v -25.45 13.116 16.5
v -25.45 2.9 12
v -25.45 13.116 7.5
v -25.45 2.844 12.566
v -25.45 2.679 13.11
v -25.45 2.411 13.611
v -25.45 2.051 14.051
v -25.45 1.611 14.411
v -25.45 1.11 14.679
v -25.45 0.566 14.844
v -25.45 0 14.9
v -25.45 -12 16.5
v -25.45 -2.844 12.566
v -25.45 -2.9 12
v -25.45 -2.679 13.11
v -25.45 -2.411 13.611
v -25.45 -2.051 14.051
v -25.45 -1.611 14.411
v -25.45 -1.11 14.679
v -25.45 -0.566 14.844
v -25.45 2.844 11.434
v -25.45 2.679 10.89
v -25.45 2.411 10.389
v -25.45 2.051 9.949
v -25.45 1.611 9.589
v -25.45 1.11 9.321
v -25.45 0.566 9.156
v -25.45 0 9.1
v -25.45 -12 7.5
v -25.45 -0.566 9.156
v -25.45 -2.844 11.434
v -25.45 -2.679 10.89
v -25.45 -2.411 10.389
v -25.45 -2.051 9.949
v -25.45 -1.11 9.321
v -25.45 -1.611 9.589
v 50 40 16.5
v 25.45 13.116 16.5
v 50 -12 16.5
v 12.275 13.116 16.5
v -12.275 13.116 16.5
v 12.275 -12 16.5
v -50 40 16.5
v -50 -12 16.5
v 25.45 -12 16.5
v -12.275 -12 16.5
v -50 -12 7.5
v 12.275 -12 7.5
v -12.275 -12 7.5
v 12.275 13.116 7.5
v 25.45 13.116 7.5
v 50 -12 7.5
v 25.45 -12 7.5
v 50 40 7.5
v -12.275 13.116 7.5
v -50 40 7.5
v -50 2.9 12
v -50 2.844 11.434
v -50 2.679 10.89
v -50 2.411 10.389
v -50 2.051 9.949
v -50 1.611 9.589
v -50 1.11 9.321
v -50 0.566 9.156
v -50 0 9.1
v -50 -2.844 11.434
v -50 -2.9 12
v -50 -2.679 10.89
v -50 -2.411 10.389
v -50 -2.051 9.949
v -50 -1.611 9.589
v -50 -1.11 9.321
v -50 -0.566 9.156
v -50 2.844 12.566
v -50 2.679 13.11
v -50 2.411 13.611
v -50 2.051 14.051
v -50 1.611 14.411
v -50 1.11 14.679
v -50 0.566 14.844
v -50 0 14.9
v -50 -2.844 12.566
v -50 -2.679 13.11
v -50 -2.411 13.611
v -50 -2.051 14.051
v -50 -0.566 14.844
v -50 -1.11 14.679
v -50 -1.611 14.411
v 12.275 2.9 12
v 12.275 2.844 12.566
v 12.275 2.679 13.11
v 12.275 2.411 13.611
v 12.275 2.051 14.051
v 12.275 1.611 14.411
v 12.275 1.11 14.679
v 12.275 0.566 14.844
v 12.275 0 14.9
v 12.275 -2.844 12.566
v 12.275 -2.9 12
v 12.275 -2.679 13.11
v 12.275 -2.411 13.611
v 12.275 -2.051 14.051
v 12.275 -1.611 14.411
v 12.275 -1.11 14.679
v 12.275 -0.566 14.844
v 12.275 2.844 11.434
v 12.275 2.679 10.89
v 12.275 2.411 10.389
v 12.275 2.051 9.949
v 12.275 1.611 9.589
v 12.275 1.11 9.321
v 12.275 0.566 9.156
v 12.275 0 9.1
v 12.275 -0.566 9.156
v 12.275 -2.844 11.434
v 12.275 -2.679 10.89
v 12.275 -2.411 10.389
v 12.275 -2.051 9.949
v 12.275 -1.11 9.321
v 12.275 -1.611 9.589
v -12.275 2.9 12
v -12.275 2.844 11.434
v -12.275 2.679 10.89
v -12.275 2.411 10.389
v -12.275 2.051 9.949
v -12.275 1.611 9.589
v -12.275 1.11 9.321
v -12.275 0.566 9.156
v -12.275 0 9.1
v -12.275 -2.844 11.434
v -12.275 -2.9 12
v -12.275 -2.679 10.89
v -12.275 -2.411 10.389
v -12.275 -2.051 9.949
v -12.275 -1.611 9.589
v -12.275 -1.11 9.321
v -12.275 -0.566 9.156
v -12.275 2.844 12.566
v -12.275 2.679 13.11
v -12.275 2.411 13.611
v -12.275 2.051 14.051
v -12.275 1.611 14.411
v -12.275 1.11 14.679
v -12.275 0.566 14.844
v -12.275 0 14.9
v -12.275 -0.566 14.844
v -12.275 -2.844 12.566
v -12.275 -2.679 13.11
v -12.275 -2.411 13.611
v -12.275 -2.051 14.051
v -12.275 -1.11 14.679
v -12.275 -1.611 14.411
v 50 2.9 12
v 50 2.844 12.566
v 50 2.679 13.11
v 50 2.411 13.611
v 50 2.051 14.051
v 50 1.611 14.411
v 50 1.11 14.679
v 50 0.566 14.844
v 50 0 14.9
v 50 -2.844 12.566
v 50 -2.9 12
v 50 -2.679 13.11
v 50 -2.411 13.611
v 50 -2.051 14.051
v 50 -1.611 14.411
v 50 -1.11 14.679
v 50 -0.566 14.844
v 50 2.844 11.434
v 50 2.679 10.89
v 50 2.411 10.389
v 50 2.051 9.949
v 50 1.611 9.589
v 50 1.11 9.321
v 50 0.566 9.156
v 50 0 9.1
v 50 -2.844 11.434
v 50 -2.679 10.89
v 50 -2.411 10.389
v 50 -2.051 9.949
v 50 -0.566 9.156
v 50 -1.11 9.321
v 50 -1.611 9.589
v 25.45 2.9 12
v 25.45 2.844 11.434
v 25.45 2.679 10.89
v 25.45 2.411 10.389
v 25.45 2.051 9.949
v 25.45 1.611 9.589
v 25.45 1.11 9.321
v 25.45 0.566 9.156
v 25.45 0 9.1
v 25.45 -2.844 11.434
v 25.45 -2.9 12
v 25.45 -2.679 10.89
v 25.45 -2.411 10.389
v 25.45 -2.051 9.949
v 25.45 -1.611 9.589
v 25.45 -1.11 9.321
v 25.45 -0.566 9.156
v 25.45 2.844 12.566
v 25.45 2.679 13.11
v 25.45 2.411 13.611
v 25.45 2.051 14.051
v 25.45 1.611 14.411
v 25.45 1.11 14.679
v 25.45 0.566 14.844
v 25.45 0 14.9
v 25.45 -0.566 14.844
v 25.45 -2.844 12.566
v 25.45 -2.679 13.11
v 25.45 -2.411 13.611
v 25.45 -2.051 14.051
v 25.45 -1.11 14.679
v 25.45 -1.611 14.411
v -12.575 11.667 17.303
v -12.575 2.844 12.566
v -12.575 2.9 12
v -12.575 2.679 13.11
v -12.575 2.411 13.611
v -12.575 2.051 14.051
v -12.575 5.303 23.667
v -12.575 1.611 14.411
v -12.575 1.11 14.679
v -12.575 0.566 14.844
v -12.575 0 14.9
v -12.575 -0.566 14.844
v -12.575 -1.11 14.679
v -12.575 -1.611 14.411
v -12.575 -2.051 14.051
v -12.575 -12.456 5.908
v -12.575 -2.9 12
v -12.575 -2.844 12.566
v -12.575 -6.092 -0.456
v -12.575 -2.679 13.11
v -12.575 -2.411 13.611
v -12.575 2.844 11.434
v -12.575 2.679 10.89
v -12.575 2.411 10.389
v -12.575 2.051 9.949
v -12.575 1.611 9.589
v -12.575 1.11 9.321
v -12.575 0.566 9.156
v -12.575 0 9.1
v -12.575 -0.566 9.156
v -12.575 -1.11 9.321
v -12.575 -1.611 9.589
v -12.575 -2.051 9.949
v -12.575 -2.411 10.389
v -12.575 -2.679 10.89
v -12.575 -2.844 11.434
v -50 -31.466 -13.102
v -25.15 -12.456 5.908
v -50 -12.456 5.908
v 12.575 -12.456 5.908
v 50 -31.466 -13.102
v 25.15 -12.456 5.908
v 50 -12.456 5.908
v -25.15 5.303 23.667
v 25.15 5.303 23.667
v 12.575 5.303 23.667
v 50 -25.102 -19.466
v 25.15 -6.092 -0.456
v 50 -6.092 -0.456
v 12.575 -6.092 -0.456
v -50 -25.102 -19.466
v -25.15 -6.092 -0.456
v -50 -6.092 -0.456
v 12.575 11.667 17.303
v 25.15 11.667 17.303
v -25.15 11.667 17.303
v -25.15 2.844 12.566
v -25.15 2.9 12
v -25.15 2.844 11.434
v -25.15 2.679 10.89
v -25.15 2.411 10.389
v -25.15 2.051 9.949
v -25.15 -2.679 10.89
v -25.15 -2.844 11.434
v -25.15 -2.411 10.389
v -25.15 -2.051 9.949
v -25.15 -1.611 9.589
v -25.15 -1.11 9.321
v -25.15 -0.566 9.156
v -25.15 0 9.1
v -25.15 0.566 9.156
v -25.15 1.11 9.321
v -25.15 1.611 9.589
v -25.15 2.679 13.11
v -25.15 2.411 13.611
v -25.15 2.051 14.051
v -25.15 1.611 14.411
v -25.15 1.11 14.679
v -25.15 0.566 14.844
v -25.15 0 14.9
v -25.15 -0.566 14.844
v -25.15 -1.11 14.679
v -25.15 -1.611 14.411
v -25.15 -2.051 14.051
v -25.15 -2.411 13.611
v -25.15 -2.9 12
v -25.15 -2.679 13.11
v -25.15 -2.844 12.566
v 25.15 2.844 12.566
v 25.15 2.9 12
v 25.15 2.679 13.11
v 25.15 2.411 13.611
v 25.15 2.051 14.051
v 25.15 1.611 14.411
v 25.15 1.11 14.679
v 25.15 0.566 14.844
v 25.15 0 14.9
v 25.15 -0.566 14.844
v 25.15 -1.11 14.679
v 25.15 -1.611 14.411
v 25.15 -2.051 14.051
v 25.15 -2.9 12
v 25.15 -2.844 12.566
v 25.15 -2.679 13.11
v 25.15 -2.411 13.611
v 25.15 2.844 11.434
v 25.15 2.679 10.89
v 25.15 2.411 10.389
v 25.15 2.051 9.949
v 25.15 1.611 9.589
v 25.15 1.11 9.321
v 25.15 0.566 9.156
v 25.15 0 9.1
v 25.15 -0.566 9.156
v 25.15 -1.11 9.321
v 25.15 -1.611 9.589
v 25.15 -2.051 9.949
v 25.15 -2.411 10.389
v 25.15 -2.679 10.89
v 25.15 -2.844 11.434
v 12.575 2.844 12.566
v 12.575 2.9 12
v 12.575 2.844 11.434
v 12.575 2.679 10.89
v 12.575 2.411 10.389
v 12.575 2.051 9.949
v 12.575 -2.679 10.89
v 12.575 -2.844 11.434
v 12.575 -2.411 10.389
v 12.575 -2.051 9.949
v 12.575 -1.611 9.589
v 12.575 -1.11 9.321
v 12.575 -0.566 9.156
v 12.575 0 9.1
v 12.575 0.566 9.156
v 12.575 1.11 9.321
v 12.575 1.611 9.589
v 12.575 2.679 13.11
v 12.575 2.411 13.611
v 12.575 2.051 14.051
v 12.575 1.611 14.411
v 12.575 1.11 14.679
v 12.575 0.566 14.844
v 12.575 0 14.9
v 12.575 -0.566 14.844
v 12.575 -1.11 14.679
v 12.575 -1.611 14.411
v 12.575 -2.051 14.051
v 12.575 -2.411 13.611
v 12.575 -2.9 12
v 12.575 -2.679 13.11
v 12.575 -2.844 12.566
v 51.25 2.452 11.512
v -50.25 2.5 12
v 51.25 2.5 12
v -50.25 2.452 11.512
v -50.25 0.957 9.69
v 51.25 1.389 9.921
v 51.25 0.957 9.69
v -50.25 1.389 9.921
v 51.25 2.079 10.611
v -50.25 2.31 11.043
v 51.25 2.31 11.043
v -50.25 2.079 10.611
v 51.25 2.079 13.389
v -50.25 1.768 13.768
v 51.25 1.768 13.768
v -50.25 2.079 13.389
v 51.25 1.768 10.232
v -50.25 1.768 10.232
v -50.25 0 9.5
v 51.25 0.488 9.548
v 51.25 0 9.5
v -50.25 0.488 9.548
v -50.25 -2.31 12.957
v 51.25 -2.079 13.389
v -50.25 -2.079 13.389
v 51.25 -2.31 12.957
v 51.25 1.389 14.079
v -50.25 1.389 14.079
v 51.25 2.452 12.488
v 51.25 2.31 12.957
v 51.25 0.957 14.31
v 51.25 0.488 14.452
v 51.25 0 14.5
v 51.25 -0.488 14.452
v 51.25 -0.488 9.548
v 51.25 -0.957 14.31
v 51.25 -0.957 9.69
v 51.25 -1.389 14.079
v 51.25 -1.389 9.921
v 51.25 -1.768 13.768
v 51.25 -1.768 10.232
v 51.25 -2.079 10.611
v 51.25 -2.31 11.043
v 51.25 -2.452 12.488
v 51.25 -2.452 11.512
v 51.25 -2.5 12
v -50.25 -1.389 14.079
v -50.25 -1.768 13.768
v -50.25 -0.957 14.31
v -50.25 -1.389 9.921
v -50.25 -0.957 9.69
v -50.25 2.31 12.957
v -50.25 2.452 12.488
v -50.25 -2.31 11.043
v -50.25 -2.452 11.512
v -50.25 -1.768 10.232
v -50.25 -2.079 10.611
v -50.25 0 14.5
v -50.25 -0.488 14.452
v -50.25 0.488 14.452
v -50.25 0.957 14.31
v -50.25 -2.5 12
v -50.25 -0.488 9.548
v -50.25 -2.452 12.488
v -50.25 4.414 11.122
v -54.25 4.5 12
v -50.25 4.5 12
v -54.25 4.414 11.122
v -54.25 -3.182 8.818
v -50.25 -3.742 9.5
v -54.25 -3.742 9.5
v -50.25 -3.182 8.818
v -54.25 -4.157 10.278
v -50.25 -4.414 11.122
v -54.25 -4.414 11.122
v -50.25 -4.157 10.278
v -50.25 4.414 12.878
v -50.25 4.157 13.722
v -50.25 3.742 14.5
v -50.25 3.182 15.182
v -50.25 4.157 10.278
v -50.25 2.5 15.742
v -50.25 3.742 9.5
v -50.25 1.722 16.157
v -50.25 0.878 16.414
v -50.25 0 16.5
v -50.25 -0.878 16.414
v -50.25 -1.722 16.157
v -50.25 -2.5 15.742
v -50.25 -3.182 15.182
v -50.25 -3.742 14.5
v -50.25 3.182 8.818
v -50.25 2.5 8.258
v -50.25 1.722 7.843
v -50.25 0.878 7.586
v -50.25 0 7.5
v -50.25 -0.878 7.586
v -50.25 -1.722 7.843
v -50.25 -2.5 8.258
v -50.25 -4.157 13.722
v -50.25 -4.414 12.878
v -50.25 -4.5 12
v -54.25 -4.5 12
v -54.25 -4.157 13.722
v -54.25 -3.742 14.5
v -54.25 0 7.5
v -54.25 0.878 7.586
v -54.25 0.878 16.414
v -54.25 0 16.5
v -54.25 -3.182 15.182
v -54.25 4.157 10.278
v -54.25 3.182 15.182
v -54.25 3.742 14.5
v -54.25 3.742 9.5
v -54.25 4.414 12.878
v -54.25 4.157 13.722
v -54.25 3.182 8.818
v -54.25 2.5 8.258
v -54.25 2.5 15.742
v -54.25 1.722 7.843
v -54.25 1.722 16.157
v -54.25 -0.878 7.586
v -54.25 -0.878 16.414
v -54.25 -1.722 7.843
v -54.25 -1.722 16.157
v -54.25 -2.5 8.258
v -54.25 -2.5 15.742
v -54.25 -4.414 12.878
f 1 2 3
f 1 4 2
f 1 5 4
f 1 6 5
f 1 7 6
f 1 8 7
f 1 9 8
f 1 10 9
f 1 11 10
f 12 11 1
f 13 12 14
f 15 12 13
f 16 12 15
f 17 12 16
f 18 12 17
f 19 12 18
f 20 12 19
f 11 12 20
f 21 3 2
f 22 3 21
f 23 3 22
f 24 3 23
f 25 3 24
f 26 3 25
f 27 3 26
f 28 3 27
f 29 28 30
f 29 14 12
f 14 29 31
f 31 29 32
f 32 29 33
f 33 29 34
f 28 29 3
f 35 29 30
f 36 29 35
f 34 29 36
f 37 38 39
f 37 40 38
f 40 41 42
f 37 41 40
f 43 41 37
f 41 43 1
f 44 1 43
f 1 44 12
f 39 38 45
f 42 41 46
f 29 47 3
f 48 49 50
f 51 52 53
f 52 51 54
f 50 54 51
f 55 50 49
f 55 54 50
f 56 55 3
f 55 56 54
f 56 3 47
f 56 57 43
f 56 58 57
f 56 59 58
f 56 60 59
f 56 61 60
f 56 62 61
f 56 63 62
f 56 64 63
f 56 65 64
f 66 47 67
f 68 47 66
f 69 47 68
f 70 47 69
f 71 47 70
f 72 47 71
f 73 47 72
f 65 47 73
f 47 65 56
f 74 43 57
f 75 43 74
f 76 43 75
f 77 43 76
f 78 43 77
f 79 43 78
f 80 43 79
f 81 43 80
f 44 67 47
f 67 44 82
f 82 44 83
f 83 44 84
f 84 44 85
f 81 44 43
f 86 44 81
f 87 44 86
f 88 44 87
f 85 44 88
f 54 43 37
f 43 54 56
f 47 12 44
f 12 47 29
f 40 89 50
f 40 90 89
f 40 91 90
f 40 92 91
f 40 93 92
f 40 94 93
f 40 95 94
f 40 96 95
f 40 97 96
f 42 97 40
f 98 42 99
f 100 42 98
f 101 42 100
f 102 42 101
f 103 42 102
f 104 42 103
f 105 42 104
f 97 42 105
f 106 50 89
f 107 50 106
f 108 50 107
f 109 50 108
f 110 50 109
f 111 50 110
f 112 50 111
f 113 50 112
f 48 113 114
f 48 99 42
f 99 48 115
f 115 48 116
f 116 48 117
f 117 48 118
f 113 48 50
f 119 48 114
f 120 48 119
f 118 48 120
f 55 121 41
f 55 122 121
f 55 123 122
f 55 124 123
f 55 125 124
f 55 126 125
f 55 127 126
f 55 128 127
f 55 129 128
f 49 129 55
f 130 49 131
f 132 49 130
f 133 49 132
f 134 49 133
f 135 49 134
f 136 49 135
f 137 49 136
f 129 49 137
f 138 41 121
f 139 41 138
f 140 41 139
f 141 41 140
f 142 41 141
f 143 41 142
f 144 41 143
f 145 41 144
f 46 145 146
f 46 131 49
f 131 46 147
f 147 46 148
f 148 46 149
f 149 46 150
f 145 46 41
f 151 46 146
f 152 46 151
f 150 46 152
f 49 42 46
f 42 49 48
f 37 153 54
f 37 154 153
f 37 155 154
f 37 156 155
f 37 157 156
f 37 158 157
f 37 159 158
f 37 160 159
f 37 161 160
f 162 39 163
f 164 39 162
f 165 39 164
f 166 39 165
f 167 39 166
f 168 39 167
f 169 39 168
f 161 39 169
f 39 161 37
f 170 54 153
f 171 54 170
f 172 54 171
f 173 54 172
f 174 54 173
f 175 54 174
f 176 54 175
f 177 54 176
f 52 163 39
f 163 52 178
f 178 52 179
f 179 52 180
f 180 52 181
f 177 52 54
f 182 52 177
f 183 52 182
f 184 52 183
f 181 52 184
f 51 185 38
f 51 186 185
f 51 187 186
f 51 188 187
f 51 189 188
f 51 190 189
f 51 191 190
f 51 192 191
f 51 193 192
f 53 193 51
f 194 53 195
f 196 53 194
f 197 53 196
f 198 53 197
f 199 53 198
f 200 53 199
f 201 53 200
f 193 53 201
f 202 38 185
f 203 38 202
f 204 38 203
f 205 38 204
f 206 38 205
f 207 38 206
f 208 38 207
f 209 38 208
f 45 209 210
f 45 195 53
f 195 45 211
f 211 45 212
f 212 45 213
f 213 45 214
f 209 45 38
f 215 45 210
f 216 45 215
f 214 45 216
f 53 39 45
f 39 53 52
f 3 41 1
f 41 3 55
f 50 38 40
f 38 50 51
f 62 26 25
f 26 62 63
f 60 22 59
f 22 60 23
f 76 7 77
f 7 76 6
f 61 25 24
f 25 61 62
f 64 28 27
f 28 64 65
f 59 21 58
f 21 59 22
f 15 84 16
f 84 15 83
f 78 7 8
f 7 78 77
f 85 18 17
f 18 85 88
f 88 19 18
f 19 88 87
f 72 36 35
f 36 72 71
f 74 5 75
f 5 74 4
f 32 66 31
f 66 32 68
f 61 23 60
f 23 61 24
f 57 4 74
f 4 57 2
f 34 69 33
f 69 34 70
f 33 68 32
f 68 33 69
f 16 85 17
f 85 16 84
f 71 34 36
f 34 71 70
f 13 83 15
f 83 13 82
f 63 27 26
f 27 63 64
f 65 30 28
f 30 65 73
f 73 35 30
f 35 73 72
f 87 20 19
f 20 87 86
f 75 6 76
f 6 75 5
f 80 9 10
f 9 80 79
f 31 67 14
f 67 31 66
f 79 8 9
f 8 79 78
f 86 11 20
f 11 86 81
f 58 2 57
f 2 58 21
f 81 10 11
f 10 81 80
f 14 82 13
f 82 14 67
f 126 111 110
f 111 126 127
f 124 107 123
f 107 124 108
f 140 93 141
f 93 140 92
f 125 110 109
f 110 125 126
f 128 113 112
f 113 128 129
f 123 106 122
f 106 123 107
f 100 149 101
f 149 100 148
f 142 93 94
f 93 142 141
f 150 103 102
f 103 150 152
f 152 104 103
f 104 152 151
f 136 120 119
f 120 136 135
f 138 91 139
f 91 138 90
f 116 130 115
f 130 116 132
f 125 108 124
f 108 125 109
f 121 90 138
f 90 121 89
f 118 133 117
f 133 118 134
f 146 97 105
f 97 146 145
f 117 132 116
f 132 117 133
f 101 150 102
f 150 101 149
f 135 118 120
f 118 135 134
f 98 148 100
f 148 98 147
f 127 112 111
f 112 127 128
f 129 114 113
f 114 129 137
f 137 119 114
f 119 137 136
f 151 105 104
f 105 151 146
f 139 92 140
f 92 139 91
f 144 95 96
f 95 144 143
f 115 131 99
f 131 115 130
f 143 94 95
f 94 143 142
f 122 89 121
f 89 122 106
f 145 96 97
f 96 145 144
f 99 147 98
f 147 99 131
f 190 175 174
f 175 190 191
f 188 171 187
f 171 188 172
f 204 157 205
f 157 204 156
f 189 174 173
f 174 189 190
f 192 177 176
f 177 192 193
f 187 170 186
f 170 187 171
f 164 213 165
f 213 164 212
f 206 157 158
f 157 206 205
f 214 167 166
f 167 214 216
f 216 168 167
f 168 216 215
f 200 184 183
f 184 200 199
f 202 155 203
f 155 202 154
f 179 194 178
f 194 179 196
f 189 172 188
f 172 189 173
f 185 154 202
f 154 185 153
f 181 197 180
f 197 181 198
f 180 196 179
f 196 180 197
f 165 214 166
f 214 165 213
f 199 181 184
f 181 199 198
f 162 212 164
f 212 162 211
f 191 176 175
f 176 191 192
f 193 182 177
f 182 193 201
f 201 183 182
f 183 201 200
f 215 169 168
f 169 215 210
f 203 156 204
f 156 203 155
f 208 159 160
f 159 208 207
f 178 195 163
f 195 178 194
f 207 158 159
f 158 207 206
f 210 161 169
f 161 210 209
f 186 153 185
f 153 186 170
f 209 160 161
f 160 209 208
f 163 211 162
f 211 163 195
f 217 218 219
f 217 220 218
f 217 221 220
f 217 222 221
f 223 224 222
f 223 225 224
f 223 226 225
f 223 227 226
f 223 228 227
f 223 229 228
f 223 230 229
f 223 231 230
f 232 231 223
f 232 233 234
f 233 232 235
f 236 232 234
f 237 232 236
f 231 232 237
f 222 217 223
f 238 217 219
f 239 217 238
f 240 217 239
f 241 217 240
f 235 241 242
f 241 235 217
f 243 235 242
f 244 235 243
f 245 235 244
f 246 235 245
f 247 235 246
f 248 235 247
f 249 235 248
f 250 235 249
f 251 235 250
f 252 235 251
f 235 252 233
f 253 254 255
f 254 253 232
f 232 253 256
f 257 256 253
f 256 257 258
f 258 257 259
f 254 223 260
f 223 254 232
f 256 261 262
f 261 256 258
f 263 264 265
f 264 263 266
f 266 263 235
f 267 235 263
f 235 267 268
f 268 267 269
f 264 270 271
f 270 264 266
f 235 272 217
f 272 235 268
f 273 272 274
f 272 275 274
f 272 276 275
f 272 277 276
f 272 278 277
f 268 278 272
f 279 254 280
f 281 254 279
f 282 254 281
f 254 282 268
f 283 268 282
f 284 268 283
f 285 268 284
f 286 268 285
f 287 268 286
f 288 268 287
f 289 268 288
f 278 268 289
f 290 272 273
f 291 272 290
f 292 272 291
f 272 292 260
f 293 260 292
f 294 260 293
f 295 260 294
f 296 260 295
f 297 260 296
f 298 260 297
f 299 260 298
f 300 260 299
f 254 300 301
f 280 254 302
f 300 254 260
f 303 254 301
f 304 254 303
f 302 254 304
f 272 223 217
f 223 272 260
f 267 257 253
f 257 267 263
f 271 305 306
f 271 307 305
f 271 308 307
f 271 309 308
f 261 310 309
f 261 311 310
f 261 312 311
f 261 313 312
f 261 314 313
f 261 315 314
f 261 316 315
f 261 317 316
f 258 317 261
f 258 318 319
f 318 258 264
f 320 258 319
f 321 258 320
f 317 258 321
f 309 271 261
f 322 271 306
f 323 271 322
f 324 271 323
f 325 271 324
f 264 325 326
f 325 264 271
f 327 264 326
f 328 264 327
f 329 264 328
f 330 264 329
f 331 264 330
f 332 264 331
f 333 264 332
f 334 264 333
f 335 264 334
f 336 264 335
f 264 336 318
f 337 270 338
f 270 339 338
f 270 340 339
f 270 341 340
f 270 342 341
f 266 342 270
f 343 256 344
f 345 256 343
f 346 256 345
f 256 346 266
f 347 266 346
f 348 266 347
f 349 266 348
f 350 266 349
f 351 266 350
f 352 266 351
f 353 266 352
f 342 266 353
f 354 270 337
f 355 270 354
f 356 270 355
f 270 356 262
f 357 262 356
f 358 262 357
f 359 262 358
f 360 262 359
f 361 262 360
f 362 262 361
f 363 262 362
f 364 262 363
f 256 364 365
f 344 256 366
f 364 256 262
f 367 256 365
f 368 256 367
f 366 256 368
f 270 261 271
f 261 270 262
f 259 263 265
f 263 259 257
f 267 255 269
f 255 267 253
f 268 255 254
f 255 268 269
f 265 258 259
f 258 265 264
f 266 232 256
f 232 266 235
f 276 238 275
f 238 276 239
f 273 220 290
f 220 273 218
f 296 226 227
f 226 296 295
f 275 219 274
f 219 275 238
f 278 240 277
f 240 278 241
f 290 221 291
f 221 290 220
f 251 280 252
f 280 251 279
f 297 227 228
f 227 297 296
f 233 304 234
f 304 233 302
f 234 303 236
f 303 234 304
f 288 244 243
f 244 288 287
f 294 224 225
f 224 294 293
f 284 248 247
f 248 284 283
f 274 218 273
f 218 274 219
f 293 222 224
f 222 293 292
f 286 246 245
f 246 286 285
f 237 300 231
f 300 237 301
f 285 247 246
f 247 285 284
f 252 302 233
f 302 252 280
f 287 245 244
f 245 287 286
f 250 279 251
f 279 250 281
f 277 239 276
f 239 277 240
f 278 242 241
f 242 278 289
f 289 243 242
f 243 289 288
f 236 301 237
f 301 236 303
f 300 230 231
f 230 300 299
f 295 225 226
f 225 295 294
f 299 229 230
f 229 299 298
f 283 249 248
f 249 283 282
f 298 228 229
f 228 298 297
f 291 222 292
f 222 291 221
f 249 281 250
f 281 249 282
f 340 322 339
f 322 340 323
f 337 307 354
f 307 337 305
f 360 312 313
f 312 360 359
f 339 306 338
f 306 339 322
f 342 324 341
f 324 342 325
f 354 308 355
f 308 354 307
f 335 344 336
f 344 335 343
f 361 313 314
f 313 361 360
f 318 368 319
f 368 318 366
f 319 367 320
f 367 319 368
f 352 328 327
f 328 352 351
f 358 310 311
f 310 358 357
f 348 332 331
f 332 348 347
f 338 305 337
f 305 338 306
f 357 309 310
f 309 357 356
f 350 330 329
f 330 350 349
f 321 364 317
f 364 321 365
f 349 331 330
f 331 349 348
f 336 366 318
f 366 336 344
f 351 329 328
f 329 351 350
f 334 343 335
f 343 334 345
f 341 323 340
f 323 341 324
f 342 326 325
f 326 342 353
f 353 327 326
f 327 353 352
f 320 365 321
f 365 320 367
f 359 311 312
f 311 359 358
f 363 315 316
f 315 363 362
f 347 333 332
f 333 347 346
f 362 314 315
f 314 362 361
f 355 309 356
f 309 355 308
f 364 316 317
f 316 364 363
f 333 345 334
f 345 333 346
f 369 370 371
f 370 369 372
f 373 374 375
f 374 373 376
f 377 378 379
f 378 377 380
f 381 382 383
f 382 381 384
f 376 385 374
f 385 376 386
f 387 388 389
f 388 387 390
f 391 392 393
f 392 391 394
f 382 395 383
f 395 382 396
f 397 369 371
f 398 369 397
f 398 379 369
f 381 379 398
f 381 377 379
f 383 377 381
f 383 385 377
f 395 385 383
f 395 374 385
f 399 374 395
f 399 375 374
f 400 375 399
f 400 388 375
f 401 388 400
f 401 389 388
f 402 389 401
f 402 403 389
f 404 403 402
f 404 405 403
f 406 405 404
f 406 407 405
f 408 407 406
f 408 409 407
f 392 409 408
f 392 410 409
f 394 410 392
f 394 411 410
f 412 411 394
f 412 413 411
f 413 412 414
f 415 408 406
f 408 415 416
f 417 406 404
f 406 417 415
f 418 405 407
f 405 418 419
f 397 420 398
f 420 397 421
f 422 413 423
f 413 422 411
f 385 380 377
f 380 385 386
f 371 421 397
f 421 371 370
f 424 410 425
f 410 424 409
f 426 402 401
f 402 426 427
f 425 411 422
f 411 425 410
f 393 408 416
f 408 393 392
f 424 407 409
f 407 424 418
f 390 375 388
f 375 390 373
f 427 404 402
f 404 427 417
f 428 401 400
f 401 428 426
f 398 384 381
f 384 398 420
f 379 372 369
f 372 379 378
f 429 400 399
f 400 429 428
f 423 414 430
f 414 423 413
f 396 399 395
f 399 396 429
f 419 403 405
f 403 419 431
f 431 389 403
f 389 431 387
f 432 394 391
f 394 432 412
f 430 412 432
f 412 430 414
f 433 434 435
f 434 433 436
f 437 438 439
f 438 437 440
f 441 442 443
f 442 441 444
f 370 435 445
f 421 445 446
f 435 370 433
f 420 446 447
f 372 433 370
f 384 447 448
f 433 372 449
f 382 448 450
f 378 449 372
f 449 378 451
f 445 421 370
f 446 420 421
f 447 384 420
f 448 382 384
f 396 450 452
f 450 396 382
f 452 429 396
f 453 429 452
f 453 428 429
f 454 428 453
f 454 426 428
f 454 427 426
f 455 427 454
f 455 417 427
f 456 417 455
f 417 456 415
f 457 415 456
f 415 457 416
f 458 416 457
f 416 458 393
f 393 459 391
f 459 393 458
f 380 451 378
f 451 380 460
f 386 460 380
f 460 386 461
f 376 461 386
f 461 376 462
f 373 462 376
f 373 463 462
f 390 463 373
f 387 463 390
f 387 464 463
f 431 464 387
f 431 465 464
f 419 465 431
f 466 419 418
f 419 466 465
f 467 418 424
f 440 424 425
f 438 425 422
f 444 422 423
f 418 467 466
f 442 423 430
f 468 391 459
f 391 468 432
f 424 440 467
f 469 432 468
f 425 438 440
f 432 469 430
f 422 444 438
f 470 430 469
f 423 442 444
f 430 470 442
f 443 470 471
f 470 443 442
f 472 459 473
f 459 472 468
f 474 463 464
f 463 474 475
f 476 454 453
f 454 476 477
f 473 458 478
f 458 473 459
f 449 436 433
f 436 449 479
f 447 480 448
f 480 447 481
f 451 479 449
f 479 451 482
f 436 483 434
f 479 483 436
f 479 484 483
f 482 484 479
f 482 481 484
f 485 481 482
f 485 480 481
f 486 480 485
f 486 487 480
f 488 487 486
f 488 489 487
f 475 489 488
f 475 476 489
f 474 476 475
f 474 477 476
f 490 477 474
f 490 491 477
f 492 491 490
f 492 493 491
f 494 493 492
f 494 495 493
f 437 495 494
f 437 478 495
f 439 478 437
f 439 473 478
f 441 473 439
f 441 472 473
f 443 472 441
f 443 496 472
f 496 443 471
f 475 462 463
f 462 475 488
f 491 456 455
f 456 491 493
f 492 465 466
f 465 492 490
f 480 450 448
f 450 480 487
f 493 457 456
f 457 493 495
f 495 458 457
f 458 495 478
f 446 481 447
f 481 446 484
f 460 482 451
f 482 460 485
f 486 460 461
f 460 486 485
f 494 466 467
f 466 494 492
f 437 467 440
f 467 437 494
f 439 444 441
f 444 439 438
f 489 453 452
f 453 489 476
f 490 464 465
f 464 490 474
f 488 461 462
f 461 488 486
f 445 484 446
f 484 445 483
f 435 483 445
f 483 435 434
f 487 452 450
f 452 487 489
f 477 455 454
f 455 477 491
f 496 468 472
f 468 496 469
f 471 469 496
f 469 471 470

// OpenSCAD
$fn = 32;

// ------------------------------------------------------------------------
// Butt hinge: hinge 100 mm, leaf swung 45 deg
// Every part is its own module, assembly() places every instance.
// ------------------------------------------------------------------------

// --- part 1 ---
module hinge_base() {
  difference() {
    union() {
      translate([-50, -12, -4.5]) cube([24.55, 52, 9]);
      translate([-12.275, -12, -4.5]) cube([24.55, 52, 9]);
      translate([25.45, -12, -4.5]) cube([24.55, 52, 9]);
      translate([-50, 13.116, -4.5]) cube([100, 26.884, 9]);
    }
    translate([-37.725, 0, 0]) rotate([0, 90, 0]) cylinder(h = 26.55, d = 5.8, center = true);
    translate([0, 0, 0]) rotate([0, 90, 0]) cylinder(h = 26.55, d = 5.8, center = true);
    translate([37.725, 0, 0]) rotate([0, 90, 0]) cylinder(h = 26.55, d = 5.8, center = true);
  }
}

// --- part 2 ---
module hinge_mover() {
  difference() {
    union() {
      translate([-25.15, -40, -4.5]) cube([12.575, 52, 9]);
      translate([12.575, -40, -4.5]) cube([12.575, 52, 9]);
      translate([-50, -40, -4.5]) cube([100, 26.884, 9]);
    }
    translate([-18.863, 0, 0]) rotate([0, 90, 0]) cylinder(h = 14.575, d = 5.8, center = true);
    translate([18.863, 0, 0]) rotate([0, 90, 0]) cylinder(h = 14.575, d = 5.8, center = true);
  }
}

// --- part 3 ---
module hinge_pin() {
  rotate([0, 90, 0]) cylinder(h = 102.5, d = 5, center = true);
  translate([-54.25, 0, 0]) rotate([0, 90, 0]) cylinder(h = 4, d = 9);
}

// --- assembly ---
module assembly() {
  color([0.80, 0.24, 0.20]) translate([0, 0, 12]) rotate([0, 0, 0]) hinge_base();
  color([0.20, 0.45, 0.75]) translate([0, 0, 12]) rotate([45, 0, 0]) hinge_mover();
  color([0.25, 0.62, 0.32]) translate([0, 0, 12]) rotate([0, 0, 0]) hinge_pin();
}

assembly();
